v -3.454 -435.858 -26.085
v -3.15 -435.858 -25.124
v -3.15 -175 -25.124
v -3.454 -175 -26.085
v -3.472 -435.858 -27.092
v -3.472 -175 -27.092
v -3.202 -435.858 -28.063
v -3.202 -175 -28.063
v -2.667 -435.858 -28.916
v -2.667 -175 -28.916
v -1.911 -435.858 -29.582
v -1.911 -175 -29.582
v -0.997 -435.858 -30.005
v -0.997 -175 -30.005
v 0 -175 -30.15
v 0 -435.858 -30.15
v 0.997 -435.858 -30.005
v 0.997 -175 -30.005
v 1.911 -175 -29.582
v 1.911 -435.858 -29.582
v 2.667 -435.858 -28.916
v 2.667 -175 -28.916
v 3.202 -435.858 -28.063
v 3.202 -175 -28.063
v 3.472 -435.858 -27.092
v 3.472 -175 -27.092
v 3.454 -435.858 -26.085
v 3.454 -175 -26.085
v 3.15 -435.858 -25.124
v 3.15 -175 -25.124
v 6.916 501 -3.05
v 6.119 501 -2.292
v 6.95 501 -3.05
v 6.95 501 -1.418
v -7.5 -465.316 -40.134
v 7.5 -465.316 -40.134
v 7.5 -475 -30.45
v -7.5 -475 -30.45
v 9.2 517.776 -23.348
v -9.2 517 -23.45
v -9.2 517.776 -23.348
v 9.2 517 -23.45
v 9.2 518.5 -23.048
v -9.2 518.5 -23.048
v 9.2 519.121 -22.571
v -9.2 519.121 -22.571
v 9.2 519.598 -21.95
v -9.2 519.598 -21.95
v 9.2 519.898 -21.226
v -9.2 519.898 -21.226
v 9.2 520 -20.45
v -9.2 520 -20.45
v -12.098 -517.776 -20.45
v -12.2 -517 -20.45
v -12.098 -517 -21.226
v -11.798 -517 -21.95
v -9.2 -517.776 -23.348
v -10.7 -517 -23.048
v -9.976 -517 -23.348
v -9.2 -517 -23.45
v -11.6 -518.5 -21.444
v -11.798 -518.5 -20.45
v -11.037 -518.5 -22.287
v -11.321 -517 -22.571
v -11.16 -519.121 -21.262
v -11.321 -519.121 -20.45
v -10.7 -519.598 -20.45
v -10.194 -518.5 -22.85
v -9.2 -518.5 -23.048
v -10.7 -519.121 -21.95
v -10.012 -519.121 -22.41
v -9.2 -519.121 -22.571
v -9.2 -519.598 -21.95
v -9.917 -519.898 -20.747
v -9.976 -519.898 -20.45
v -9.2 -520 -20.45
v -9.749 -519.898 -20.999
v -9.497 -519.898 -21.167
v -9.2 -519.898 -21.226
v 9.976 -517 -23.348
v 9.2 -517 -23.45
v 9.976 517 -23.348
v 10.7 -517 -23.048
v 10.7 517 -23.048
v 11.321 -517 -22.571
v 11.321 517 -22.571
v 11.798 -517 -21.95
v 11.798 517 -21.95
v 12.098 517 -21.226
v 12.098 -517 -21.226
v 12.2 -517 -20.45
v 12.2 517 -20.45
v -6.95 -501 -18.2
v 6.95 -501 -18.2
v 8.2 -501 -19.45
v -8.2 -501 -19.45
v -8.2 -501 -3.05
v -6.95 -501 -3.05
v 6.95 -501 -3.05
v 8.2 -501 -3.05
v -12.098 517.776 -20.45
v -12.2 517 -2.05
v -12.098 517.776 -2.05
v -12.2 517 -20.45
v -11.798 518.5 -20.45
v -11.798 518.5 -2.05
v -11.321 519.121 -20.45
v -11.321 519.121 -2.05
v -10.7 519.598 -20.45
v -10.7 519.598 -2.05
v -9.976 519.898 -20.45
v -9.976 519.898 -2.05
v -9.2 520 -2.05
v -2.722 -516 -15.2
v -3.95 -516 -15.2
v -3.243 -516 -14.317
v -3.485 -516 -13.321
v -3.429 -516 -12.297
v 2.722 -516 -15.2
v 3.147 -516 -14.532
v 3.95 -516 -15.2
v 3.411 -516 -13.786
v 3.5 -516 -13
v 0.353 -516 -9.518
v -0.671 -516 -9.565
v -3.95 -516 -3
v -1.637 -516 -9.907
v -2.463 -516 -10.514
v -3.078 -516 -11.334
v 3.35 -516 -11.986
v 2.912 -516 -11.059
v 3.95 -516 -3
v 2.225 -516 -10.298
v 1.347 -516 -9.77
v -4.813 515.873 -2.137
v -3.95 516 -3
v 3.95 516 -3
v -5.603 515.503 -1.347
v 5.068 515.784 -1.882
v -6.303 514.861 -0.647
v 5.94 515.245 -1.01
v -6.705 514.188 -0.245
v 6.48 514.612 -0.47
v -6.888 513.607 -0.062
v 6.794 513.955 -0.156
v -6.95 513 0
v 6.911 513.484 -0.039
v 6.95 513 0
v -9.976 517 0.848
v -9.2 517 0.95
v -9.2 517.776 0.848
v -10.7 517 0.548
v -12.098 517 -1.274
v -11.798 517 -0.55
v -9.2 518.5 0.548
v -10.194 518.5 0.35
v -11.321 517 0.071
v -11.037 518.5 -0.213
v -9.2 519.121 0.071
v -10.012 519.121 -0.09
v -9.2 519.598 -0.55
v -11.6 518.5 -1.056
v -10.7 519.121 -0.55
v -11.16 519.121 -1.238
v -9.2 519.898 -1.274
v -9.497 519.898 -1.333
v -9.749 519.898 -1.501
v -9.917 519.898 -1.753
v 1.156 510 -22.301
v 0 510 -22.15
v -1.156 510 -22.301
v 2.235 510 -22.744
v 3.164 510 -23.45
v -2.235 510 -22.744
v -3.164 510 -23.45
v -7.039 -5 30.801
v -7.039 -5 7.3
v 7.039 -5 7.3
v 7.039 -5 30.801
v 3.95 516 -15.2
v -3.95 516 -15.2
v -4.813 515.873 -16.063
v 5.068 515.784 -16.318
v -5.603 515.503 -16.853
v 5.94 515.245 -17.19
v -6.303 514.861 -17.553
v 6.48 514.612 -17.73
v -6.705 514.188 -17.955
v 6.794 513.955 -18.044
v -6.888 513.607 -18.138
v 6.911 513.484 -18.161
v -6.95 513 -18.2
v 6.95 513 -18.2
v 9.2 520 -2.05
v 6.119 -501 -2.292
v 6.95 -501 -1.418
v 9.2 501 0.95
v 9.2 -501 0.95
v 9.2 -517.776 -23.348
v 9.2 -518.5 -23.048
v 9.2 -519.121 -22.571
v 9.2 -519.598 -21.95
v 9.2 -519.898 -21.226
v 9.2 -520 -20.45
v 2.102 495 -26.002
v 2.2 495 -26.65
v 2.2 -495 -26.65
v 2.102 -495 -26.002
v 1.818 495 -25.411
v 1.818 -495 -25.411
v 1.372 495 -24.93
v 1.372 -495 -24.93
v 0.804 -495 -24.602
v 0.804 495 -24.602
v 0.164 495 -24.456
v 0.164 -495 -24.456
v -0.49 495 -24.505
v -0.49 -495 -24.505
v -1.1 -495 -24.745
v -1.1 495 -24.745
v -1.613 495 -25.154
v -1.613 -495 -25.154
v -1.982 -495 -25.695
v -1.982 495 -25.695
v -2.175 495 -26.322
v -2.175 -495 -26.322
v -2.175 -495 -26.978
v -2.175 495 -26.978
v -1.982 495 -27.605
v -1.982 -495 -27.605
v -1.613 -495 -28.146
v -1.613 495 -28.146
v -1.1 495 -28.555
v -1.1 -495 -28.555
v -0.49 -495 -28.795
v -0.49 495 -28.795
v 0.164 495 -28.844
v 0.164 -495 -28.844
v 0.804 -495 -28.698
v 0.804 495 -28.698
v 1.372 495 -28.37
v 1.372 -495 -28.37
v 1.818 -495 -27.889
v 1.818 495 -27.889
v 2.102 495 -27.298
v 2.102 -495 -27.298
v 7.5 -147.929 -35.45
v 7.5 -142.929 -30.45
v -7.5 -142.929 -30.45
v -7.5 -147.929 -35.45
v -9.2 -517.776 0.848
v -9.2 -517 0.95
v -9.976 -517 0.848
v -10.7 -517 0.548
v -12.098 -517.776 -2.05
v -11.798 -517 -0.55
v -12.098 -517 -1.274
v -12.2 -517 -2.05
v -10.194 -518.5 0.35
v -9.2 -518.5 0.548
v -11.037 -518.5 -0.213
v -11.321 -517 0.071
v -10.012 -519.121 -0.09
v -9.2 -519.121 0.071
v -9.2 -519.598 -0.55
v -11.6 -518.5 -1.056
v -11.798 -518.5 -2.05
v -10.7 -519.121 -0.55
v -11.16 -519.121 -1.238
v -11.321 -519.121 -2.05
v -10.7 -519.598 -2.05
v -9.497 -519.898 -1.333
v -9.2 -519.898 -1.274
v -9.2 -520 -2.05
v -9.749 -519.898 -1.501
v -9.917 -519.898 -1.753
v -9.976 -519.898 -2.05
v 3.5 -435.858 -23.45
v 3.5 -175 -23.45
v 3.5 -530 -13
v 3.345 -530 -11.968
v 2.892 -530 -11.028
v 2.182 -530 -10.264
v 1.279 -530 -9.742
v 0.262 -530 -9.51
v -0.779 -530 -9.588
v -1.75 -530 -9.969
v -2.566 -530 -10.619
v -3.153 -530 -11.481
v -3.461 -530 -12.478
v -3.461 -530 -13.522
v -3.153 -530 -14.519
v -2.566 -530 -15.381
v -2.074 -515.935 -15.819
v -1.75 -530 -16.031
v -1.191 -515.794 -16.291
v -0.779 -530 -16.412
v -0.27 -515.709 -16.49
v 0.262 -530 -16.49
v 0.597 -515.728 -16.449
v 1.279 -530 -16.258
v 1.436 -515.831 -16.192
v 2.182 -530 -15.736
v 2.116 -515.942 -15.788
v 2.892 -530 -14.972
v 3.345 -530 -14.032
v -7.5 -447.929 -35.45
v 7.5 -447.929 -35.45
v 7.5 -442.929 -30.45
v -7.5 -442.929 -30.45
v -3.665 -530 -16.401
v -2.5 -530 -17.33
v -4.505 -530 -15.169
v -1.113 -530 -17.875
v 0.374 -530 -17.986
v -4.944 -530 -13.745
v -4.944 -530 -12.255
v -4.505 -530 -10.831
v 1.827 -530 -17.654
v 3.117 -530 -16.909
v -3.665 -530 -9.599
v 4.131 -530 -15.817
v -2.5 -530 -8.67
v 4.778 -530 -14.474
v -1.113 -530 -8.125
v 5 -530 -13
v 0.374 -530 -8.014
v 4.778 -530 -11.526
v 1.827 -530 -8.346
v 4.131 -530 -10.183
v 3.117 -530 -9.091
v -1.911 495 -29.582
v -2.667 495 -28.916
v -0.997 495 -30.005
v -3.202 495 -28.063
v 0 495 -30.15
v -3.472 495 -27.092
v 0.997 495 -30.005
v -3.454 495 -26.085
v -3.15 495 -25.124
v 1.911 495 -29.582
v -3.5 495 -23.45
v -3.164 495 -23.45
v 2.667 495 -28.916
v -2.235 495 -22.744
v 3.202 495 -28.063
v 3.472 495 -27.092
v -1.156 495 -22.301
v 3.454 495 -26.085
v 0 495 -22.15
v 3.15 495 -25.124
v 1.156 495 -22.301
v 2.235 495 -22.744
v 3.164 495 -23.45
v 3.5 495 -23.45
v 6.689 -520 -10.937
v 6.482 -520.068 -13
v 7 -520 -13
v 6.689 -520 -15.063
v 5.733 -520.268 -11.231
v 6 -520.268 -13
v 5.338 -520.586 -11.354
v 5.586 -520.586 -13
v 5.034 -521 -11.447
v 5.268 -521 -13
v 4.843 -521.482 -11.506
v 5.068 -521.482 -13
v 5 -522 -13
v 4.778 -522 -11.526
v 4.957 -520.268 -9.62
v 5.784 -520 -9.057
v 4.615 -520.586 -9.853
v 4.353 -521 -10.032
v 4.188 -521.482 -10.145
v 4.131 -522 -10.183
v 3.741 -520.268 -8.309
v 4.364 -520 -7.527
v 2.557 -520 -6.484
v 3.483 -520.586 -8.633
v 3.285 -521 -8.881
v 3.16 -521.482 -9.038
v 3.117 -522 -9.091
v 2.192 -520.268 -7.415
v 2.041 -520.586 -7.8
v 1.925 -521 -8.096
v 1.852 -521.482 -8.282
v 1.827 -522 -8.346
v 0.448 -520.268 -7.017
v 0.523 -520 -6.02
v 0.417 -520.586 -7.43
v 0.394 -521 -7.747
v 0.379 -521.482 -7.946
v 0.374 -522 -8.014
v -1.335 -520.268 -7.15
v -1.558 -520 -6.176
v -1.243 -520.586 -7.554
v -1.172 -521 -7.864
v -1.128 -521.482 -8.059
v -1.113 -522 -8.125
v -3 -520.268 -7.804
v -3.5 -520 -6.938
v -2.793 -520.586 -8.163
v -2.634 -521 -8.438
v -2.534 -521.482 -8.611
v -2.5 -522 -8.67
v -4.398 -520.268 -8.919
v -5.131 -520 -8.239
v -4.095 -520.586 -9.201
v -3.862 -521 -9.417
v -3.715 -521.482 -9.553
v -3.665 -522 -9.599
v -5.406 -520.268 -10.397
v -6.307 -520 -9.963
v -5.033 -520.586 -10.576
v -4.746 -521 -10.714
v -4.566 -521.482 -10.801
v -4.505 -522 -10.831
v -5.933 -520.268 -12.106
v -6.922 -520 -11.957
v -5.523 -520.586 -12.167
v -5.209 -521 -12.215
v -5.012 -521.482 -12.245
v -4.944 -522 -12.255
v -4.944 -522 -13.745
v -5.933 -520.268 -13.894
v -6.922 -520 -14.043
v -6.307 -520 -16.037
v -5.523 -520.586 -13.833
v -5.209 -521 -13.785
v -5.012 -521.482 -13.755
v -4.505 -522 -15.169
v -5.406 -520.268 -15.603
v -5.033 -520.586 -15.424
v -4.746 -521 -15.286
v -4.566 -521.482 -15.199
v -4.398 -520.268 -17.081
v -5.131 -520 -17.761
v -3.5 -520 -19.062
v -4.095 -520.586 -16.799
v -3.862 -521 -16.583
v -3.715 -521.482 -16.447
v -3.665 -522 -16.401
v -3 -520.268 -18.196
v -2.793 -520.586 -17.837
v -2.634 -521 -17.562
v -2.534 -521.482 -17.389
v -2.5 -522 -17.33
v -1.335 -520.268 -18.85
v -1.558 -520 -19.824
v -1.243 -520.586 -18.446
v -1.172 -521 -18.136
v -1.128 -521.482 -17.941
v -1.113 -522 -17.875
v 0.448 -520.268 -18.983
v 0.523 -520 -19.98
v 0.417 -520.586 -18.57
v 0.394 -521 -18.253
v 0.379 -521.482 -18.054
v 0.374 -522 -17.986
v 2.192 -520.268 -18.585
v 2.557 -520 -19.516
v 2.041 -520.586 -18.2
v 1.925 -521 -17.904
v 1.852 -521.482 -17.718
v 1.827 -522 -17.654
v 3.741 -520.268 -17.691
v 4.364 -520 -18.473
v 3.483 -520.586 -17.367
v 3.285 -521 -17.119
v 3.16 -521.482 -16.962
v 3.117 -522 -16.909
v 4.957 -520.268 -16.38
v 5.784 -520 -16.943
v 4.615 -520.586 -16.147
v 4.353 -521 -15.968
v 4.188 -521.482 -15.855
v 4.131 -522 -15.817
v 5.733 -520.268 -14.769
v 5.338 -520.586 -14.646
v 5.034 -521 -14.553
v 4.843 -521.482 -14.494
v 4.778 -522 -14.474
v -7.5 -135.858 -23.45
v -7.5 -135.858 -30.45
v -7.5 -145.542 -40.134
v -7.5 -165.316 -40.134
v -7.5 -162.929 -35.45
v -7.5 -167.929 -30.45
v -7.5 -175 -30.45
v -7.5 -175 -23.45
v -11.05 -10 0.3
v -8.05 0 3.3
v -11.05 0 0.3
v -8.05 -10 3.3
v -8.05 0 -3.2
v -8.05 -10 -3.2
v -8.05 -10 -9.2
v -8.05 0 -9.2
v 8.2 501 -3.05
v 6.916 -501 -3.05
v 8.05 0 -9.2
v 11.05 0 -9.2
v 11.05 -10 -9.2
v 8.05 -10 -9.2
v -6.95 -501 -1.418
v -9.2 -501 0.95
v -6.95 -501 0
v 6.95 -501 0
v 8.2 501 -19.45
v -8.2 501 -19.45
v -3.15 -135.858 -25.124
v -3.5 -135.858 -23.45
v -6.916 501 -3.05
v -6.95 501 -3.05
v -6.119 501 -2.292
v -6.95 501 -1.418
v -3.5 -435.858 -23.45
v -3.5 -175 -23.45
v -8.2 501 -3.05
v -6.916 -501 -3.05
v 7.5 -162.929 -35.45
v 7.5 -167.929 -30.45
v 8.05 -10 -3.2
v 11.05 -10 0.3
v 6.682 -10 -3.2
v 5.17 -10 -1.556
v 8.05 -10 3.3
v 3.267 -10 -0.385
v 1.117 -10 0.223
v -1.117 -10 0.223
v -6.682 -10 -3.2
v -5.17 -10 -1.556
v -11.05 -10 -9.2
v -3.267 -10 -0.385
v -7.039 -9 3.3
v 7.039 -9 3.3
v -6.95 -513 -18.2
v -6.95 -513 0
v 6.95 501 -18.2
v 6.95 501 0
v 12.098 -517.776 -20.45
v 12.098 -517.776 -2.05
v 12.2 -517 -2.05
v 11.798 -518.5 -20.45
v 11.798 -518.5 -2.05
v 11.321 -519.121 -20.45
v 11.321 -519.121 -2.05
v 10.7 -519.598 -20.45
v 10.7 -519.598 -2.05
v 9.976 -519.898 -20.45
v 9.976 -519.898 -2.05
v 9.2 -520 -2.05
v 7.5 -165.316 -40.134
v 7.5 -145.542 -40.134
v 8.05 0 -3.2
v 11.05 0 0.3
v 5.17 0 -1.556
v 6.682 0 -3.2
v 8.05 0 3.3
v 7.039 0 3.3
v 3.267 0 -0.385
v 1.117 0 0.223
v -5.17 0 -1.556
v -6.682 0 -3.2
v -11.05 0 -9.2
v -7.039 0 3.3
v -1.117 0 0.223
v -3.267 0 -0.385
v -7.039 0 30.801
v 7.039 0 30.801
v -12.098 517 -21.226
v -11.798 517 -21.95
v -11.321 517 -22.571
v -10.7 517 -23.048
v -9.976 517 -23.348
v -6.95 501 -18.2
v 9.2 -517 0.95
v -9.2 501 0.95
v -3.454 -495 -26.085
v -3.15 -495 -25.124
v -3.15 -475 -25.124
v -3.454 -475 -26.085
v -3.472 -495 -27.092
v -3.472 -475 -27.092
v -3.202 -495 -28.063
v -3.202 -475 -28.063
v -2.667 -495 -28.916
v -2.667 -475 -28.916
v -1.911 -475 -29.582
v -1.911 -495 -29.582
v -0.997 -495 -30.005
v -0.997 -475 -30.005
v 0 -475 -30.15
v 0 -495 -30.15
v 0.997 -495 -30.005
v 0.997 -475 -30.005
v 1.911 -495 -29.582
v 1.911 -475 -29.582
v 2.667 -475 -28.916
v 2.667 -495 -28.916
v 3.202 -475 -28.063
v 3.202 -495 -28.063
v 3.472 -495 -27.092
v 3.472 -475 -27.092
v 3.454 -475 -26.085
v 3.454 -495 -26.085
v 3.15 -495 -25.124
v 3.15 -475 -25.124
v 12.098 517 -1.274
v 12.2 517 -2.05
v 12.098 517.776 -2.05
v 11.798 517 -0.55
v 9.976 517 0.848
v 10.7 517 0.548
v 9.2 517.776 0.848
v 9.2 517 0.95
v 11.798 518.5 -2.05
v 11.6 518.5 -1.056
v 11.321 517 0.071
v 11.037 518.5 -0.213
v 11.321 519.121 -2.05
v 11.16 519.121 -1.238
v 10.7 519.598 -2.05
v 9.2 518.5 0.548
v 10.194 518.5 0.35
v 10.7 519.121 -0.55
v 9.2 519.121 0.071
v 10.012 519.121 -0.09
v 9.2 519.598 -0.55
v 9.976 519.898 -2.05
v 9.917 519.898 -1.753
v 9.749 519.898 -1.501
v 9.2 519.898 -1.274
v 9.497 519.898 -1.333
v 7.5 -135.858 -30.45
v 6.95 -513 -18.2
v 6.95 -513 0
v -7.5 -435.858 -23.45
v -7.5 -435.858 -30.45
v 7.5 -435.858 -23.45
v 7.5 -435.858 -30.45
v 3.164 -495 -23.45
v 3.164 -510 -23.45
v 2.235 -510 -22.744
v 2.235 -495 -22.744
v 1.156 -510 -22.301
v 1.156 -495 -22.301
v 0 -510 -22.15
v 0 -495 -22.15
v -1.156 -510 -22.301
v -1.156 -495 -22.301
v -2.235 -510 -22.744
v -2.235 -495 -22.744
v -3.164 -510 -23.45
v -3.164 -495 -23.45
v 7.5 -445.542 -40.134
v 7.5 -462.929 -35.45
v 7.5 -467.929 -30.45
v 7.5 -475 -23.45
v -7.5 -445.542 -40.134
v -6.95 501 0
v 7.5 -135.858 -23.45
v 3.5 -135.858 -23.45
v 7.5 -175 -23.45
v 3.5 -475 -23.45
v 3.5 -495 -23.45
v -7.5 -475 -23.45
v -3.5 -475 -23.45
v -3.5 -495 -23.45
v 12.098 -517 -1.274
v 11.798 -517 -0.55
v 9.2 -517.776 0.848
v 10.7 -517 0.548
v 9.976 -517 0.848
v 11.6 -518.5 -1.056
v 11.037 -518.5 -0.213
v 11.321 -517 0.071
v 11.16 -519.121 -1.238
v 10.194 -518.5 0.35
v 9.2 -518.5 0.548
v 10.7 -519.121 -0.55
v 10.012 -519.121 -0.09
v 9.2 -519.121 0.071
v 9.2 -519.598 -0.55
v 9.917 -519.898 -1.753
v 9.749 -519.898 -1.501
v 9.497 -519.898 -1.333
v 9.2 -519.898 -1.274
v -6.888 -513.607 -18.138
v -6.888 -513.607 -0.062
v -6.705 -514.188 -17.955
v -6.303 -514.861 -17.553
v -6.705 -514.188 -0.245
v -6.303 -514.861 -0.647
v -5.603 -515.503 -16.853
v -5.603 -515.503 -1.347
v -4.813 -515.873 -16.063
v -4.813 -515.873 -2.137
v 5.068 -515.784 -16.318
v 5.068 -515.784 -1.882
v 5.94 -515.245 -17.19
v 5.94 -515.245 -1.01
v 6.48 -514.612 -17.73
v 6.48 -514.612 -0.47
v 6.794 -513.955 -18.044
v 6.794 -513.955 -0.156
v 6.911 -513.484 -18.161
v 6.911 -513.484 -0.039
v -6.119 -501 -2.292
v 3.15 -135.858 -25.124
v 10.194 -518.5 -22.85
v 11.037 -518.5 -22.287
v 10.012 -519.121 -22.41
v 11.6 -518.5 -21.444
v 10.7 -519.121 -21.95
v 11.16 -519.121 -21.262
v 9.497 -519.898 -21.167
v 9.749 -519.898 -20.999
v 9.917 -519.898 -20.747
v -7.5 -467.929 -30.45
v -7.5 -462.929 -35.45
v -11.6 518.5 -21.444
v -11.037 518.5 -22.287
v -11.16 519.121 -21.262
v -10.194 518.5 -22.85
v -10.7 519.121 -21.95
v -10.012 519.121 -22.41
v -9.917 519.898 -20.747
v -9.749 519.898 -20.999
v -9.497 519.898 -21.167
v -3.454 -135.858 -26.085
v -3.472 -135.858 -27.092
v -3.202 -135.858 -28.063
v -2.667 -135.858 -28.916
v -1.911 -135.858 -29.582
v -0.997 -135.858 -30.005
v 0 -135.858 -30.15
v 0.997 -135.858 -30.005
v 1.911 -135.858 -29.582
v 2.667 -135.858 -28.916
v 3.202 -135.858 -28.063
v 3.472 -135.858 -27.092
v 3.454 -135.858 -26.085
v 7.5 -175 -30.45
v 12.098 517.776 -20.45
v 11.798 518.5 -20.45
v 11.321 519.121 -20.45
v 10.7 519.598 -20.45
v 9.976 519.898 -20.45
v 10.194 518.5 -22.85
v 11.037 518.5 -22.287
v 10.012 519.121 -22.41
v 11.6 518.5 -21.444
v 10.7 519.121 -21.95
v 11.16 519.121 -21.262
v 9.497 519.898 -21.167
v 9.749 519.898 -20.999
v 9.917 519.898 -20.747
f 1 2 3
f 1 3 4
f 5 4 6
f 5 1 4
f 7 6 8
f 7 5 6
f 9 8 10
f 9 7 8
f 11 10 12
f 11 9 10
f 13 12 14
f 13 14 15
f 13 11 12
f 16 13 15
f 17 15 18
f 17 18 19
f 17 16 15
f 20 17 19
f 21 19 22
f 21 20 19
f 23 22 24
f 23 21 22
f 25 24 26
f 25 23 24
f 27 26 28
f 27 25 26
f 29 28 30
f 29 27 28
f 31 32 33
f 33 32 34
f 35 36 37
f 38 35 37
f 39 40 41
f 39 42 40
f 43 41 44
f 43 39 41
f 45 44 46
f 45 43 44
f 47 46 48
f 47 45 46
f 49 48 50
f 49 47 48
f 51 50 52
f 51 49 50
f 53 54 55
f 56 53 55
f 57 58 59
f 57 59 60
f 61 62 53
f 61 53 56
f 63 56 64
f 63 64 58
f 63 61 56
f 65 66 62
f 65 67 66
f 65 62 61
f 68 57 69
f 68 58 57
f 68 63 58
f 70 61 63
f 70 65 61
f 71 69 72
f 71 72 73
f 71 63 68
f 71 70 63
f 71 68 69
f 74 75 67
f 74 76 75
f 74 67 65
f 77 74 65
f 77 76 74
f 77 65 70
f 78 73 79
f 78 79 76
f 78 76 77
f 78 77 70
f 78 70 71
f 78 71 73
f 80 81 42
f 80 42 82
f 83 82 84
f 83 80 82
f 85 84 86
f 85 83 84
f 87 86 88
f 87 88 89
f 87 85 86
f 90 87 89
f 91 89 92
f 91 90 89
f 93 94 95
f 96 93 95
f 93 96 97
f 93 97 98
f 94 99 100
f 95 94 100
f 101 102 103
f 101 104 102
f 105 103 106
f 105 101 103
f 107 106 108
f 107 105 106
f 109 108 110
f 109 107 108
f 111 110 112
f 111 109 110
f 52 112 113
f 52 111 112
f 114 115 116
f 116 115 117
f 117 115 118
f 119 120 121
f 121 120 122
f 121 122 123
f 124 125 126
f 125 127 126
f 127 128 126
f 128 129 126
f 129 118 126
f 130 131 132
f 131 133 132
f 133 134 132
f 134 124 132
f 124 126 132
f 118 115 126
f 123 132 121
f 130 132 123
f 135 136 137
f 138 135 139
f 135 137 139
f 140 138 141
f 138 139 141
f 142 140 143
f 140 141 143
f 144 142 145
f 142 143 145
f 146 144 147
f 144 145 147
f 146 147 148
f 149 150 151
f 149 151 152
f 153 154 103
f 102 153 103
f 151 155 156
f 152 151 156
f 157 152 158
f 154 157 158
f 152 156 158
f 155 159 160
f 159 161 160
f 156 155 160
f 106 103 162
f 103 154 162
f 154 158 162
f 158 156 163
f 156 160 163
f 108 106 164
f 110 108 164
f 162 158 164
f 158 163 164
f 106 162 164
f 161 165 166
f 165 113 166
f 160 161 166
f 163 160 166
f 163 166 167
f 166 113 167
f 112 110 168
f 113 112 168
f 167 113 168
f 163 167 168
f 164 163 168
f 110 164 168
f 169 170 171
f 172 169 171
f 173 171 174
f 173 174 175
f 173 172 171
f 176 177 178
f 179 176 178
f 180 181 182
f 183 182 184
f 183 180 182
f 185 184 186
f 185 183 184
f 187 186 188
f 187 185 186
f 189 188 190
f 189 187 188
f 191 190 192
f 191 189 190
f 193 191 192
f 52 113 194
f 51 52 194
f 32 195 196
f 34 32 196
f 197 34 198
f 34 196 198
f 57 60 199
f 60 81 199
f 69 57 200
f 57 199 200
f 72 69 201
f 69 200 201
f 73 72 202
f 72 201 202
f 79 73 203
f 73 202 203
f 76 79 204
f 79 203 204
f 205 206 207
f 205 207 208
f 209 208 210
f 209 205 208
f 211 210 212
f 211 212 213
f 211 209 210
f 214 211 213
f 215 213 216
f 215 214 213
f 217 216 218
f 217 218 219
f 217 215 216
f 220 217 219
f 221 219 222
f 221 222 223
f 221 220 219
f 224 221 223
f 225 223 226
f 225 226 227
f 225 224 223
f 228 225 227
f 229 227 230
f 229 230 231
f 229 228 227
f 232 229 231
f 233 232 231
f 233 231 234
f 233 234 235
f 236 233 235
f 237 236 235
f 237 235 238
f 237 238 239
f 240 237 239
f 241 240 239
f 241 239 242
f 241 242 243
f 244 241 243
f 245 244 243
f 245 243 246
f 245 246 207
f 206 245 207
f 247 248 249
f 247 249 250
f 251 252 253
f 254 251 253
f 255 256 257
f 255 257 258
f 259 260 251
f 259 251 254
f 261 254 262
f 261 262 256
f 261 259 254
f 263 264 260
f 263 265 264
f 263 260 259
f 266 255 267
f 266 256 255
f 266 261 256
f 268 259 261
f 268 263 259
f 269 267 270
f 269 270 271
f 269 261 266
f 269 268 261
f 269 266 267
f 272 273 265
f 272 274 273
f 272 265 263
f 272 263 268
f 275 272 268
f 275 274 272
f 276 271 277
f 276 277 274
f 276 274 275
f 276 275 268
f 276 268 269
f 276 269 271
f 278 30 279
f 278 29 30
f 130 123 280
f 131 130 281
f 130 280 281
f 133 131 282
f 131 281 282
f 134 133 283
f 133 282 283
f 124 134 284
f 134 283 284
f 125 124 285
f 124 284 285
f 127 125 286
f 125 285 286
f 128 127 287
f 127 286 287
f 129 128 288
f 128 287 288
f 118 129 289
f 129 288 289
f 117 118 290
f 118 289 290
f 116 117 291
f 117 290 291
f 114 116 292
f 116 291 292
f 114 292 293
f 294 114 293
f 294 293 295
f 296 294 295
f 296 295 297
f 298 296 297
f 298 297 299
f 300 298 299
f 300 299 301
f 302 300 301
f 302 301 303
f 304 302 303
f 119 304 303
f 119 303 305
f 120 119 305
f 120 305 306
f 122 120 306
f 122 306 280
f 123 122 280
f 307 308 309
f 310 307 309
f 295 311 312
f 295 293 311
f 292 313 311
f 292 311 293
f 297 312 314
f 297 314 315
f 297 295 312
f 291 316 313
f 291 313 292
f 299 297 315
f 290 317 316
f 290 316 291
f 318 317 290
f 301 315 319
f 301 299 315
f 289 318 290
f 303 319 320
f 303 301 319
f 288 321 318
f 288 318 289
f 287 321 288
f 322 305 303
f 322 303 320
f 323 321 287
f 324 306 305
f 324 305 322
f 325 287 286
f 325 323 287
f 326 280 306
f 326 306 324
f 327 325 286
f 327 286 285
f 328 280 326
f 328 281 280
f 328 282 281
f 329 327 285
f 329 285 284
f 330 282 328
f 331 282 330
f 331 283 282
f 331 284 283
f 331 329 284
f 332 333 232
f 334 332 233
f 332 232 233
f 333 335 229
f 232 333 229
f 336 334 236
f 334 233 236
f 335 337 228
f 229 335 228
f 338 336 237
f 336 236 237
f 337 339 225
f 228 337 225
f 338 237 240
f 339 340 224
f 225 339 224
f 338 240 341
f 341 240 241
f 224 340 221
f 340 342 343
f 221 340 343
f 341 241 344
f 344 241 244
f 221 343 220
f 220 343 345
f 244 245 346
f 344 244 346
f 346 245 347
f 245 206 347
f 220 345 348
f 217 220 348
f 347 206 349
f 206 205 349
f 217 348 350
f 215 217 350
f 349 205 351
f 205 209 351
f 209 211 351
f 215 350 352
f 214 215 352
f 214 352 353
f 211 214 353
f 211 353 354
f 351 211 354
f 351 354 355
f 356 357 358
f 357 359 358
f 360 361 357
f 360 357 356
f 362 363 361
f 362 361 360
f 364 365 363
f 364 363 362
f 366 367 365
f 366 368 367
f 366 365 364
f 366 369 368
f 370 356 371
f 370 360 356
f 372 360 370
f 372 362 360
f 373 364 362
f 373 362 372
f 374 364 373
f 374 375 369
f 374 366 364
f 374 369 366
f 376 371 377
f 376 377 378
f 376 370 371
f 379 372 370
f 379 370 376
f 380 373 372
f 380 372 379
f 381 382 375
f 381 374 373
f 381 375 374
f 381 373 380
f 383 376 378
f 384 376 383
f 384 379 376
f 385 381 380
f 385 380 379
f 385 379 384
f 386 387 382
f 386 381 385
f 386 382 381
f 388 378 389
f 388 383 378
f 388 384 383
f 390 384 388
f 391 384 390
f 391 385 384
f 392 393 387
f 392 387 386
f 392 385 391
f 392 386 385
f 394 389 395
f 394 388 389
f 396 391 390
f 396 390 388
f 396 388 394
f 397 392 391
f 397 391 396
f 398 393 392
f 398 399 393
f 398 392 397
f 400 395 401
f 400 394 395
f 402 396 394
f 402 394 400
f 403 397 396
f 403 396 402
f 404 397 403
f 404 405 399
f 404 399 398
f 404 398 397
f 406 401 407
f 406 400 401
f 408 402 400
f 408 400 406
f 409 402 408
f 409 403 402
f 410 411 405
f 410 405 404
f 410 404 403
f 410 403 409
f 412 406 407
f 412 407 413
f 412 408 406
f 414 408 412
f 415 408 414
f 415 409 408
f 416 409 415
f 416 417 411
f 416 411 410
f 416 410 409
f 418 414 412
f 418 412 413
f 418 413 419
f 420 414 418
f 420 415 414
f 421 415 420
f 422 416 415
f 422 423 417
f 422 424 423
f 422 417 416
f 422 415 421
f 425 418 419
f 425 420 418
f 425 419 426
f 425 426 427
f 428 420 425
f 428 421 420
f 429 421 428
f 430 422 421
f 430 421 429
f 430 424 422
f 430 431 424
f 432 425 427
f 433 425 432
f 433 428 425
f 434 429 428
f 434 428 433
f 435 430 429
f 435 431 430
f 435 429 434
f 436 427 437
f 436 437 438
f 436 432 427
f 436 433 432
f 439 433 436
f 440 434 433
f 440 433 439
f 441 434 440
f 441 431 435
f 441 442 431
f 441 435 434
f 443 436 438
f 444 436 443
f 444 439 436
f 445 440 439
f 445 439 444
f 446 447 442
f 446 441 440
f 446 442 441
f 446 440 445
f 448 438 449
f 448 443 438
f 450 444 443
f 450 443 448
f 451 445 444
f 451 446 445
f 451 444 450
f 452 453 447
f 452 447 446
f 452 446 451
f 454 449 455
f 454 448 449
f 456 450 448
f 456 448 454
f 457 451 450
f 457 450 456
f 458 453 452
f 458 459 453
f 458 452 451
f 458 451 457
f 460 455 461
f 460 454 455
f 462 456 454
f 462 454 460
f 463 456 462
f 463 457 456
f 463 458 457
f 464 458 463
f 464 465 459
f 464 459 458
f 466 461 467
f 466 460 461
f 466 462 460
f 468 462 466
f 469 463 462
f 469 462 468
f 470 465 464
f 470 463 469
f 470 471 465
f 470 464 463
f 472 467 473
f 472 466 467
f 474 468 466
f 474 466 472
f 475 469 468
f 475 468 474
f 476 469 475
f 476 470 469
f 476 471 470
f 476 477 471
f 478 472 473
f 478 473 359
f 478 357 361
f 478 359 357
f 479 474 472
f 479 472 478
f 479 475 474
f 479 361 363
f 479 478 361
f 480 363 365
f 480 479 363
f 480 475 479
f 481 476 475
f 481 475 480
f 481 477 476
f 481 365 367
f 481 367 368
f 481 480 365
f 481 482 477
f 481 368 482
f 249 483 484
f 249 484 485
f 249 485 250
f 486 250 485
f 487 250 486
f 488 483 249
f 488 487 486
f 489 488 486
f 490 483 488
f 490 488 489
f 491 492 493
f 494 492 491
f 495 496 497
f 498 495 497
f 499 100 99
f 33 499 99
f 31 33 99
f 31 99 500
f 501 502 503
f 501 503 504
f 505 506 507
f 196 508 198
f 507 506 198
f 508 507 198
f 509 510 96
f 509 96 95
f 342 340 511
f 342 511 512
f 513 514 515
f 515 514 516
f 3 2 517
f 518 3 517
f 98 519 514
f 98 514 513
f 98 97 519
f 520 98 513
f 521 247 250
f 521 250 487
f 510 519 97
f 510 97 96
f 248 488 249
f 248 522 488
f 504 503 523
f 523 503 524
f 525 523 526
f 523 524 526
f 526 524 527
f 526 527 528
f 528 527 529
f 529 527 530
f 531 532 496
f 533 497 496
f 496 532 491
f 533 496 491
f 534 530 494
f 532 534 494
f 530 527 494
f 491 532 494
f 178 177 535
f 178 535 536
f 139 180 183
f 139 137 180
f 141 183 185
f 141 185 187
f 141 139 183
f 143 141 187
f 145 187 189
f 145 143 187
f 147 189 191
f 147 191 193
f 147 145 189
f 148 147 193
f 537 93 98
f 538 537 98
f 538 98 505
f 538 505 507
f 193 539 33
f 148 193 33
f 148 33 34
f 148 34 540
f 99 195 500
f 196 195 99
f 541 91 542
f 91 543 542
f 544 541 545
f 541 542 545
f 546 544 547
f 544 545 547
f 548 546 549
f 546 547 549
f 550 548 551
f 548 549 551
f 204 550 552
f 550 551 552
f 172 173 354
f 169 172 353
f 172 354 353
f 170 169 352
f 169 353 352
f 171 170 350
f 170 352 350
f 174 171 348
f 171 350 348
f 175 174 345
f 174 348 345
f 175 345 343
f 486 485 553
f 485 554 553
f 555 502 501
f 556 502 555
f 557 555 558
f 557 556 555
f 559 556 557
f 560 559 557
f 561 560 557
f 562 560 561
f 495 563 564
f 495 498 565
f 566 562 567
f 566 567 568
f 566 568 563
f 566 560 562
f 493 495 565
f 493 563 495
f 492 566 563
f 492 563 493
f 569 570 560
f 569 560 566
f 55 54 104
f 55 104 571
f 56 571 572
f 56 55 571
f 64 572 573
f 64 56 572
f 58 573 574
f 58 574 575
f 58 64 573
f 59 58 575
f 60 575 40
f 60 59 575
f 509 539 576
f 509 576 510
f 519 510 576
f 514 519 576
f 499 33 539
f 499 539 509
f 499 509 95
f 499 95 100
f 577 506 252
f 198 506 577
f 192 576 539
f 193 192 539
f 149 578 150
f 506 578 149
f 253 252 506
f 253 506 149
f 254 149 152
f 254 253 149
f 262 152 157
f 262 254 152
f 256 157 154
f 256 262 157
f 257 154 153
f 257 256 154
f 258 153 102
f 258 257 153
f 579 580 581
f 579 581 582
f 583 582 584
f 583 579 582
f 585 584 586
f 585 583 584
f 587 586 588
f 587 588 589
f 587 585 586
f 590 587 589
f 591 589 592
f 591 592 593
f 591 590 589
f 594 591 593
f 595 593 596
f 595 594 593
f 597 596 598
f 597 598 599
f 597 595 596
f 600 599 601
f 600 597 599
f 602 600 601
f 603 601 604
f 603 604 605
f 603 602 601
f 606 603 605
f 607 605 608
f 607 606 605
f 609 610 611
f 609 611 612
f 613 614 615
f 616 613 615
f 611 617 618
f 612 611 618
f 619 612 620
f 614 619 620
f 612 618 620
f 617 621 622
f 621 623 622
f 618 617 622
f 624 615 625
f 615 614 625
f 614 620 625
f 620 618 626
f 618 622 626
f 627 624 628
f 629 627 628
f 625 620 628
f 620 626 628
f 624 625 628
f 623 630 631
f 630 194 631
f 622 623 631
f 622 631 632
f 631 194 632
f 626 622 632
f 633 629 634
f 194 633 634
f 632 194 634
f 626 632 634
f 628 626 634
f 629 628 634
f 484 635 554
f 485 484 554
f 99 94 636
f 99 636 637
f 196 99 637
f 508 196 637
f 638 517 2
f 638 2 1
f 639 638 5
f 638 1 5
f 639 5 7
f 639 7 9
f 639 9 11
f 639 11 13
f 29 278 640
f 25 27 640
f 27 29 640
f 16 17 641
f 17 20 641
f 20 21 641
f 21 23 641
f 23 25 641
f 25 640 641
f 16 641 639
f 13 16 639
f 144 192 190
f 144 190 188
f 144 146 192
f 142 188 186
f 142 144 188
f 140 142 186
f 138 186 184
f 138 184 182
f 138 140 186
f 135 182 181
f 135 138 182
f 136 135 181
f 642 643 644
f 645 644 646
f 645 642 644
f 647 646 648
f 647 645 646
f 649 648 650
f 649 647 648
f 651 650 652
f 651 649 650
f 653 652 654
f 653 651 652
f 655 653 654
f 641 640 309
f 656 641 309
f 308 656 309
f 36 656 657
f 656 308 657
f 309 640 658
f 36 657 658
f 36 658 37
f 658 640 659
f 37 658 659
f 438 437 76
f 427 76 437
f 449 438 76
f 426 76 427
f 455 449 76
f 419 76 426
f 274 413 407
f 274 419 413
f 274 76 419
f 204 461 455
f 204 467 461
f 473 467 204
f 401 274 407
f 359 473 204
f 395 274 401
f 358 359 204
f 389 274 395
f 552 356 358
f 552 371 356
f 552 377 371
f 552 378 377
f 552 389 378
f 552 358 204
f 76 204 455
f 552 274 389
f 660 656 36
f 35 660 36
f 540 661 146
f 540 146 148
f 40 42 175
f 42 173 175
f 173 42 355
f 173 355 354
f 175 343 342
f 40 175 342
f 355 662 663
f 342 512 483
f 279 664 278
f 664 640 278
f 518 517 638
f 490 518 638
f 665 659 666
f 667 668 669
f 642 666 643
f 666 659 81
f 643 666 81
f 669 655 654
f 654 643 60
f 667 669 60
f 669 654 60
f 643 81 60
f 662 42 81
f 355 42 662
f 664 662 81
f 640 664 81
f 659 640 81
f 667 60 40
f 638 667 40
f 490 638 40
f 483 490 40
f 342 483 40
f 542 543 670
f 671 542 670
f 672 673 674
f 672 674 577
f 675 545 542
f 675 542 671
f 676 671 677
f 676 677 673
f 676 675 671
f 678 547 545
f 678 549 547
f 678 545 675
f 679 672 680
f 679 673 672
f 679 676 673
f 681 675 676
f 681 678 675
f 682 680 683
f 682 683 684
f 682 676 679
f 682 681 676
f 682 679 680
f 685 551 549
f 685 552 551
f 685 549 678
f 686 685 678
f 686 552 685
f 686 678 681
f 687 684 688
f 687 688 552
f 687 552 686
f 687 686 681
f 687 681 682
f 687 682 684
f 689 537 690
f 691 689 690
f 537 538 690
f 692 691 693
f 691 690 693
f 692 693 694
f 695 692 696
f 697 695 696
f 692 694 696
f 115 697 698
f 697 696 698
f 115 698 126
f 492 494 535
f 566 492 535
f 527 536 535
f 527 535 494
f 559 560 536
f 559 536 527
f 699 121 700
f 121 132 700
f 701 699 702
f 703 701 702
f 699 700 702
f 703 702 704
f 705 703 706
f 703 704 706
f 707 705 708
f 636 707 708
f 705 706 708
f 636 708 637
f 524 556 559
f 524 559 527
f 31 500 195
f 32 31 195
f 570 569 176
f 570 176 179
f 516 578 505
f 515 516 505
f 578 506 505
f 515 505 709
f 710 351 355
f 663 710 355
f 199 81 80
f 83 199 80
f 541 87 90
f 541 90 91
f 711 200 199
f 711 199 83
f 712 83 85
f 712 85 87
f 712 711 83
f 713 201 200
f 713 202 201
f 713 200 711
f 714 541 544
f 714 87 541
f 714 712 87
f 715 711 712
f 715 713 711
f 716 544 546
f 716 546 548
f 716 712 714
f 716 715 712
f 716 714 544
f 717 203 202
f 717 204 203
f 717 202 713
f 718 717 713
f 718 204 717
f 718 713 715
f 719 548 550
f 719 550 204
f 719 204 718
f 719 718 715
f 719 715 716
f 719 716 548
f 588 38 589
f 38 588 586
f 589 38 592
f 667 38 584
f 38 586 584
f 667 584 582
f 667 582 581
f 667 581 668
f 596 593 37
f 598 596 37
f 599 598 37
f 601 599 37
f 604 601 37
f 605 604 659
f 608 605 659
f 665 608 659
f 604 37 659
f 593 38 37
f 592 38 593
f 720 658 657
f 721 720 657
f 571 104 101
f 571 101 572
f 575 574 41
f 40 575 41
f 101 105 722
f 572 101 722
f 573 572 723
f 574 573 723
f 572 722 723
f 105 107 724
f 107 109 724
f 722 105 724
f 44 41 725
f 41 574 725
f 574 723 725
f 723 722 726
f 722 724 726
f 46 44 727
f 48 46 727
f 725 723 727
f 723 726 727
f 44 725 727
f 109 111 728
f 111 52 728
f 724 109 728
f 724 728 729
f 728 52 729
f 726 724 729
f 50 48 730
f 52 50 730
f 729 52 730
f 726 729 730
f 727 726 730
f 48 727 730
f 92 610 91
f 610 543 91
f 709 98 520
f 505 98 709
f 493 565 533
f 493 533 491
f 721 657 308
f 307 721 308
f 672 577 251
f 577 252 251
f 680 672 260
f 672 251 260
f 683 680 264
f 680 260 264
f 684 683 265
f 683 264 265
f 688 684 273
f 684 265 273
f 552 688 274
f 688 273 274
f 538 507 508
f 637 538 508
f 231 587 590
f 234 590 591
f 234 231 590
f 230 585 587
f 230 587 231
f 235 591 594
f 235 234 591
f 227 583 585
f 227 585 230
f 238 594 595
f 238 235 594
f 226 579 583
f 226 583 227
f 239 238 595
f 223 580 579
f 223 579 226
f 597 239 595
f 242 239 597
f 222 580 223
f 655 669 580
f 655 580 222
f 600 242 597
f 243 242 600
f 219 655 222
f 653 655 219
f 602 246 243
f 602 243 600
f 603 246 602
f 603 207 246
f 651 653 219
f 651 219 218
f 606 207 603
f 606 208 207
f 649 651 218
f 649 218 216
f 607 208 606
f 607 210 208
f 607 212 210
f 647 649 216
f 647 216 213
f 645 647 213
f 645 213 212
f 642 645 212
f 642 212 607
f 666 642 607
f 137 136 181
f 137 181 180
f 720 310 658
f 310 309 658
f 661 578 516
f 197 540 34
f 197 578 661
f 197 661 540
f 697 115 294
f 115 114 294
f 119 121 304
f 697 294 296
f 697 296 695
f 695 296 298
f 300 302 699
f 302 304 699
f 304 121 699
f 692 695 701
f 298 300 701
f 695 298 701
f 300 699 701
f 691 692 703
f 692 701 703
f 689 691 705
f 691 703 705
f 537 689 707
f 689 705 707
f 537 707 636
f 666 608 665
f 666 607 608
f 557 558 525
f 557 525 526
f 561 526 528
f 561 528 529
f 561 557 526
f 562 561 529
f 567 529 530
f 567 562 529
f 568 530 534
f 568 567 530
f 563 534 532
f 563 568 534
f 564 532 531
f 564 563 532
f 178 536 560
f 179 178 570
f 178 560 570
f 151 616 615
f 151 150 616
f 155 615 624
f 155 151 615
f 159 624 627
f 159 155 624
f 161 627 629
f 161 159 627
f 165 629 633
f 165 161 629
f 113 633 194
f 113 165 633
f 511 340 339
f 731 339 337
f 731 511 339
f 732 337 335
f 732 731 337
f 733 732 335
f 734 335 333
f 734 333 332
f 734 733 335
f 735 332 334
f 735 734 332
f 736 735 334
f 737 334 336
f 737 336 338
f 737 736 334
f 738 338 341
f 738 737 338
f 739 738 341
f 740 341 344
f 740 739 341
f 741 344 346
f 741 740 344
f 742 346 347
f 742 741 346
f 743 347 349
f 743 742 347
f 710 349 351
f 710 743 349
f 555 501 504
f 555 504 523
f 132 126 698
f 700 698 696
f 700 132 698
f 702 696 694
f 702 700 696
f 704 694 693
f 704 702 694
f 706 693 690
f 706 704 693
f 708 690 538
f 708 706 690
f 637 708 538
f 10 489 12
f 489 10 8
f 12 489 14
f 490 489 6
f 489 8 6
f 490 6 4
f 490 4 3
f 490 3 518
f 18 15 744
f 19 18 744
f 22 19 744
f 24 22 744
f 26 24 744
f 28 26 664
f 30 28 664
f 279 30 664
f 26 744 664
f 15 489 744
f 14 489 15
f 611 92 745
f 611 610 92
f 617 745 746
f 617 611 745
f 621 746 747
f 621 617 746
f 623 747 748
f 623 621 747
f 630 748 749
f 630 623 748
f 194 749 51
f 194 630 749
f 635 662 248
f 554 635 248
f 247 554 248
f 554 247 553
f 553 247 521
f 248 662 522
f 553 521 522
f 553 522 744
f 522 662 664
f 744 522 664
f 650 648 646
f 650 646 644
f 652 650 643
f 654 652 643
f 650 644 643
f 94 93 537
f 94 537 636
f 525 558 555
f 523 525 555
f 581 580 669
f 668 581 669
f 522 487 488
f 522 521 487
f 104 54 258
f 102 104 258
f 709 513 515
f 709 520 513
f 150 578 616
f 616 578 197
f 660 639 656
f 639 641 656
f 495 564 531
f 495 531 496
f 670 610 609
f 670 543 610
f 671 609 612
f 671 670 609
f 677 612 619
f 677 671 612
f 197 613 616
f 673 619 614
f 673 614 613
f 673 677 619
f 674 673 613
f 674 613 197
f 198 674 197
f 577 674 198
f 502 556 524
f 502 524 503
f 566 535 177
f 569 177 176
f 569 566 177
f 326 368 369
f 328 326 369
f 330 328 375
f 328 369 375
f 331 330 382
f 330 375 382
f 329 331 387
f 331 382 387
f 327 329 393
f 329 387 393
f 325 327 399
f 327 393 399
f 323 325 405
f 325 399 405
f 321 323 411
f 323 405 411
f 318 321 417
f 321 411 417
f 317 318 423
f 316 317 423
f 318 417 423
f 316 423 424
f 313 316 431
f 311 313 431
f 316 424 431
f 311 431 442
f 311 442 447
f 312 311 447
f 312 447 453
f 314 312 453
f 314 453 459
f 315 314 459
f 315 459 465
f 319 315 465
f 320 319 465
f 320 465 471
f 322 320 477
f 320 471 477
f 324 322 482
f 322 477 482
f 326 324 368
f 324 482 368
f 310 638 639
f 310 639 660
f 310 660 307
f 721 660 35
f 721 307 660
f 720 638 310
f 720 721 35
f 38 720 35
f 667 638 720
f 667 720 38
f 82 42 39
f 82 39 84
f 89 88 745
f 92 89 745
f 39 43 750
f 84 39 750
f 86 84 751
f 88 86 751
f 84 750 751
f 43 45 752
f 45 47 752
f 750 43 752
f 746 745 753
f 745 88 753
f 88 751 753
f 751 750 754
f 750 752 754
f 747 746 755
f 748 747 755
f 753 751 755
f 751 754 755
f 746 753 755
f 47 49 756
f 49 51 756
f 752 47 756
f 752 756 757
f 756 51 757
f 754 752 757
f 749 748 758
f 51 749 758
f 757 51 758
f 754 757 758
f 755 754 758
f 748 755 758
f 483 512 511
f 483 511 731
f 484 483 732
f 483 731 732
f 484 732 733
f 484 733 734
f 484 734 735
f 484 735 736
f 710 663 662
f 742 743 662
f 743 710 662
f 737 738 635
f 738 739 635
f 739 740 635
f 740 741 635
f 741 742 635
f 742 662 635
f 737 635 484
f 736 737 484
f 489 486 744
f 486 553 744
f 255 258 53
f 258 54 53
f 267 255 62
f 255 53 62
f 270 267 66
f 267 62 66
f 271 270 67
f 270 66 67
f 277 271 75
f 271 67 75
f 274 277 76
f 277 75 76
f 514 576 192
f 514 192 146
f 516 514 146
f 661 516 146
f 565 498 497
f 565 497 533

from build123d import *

# Parameters (mm, degrees)
PAD_DEPTH            = 10
CHAMFER_SIZE         = 3
SKETCH018_W          = 14.07752
SKETCH018_H          = 28.079826
PAD009_DEPTH         = 5
CHAMFER001_SIZE      = 4
PAD017_DEPTH         = 7.5
SKETCH026_R          = 2.2
POCKET004_DEPTH      = 0.001
POCKET004_DEPTH_BACK = 475.001
PAD008_DEPTH         = 501
SKETCH019_R          = 2.2
PAD010_DEPTH         = 495
SKETCH020_W          = 13.9
SKETCH020_H          = 18.2
PAD011_DEPTH         = 15
PAD012_DEPTH         = 4
SKETCH022_R          = 4.5
POCKET_DEPTH         = 15
FILLET_R             = 3
SKETCH023_R          = 5
PAD016_DEPTH         = 10
SKETCH024_R          = 3.5
POCKET003_DEPTH      = 17
FILLET001_R          = 2


with BuildPart() as stripplacer:
    # Sketch017 → Pad (new body)
    with BuildSketch(Plane.XZ):
        with BuildLine():
            ThreePointArc((6.682066, -3.2), (0, 0.3), (-6.682066, -3.2))
            Line((-6.682066, -3.2), (-8.05, -3.2))
            Line((-8.05, -3.2), (-8.05, -9.2))
            Line((-8.05, -9.2), (-11.05, -9.2))
            Line((-11.05, -9.2), (-11.05, 3.3))
            Line((-11.05, 3.3), (11.05, 3.3))
            Line((11.05, 3.3), (11.05, -9.2))
            Line((11.05, -9.2), (8.05, -9.2))
            Line((8.05, -9.2), (8.05, -3.2))
            Line((6.682066, -3.2), (8.05, -3.2))
        make_face()
    extrude(amount=PAD_DEPTH)

    # Chamfer
    chamfer_edges = [stripplacer.edges().sort_by_distance(p)[0] for p in [
        (11.05, -5, 3.3),
        (-11.05, -5, 3.3),
    ]]
    chamfer(chamfer_edges, length=CHAMFER_SIZE)

    # Sketch018 → Pad009 (join)
    with BuildSketch(Plane.XZ):
        with Locations((0, 16.761206)):
            Rectangle(SKETCH018_W, SKETCH018_H)
    extrude(amount=PAD009_DEPTH)

    # Chamfer001
    chamfer001_edges = [stripplacer.edges().sort_by_distance(p)[0] for p in [
        (0, -5, 3.3),
    ]]
    chamfer(chamfer001_edges, length=CHAMFER001_SIZE)


with BuildPart() as scratch:
    # Sketch025 → Pad017 (new body, symmetric)
    with BuildSketch(Plane.YZ):
        Polygon((-135.857864, -30.45), (-145.542163, -40.134299), (-165.315701, -40.134299), (-175, -30.45), (-175, -23.45), (-435.857864, -23.45), (-435.857864, -30.45), (-445.542163, -40.134299), (-465.315701, -40.134299), (-475, -30.45), (-475, -22.45), (-135.857864, -22.45), align=None)
        Polygon((-167.928932, -30.45), (-142.928932, -30.45), (-147.928932, -35.45), (-162.928932, -35.45), align=None, mode=Mode.SUBTRACT)
        Polygon((-442.928932, -30.45), (-467.928932, -30.45), (-462.928932, -35.45), (-447.928932, -35.45), align=None, mode=Mode.SUBTRACT)
    extrude(amount=PAD017_DEPTH, both=True)

    # Sketch026 → Pocket004 (cut, two sides)
    with BuildSketch(Plane.XZ) as pocket004_sk:
        with Locations((0, -26.65)):
            Circle(SKETCH026_R)
    extrude(amount=-POCKET004_DEPTH, mode=Mode.SUBTRACT)
    extrude(pocket004_sk.sketch, amount=POCKET004_DEPTH_BACK, mode=Mode.SUBTRACT)


with BuildPart() as halfbodyrod:
    # Sketch016 → Pad008 (new body)
    with BuildSketch(Plane.XZ):
        with BuildLine():
            ThreePointArc((-9.2, 0.95), (-11.32132, 0.07132), (-12.2, -2.05))
            Line((-12.2, -20.45), (-12.2, -2.05))
            ThreePointArc((-12.2, -20.45), (-11.32132, -22.57132), (-9.2, -23.45))
            Line((9.2, -23.45), (-9.2, -23.45))
            ThreePointArc((9.2, -23.45), (11.32132, -22.57132), (12.2, -20.45))
            Line((12.2, -2.05), (12.2, -20.45))
            ThreePointArc((12.2, -2.05), (11.32132, 0.07132), (9.2, 0.95))
            Line((6.11895, -2.292259), (9.2, 0.95))
            Line((6.916338, -3.05), (6.11895, -2.292259))
            Line((8.2, -3.05), (6.916338, -3.05))
            Line((8.2, -19.45), (8.2, -3.05))
            Line((-8.2, -19.45), (8.2, -19.45))
            Line((-8.2, -3.05), (-8.2, -19.45))
            Line((-8.2, -3.05), (-6.916338, -3.05))
            Line((-6.916338, -3.05), (-6.11895, -2.292259))
            Line((-9.2, 0.95), (-6.11895, -2.292259))
        make_face()
    extrude(amount=PAD008_DEPTH)

    # Sketch019 → Pad010 (join)
    with BuildSketch(Plane.XZ):
        with BuildLine():
            ThreePointArc((-3.15, -25.124385), (0, -30.15), (3.15, -25.124385))
            Line((3.15, -25.124385), (3.5, -23.45))
            Line((-3.5, -23.45), (3.5, -23.45))
            Line((-3.15, -25.124385), (-3.5, -23.45))
        make_face()
        with Locations((0, -26.65)):
            Circle(SKETCH019_R, mode=Mode.SUBTRACT)
    extrude(amount=PAD010_DEPTH)

    # Sketch020 → Pad011 (join)
    with BuildSketch(Plane.XZ.offset(501)):
        with BuildLine():
            ThreePointArc((-9.2, 0.95), (-11.32132, 0.07132), (-12.2, -2.05))
            Line((-12.2, -20.45), (-12.2, -2.05))
            ThreePointArc((-12.2, -20.45), (-11.32132, -22.57132), (-9.2, -23.45))
            Line((9.2, -23.45), (-9.2, -23.45))
            ThreePointArc((9.2, -23.45), (11.32132, -22.57132), (12.2, -20.45))
            Line((12.2, -2.05), (12.2, -20.45))
            ThreePointArc((12.2, -2.05), (11.32132, 0.07132), (9.2, 0.95))
            Line((-9.2, 0.95), (9.2, 0.95))
        make_face()
        with Locations((0, -9.1)):
            Rectangle(SKETCH020_W, SKETCH020_H, mode=Mode.SUBTRACT)
    extrude(amount=PAD011_DEPTH)

    # Sketch021 → Pad012 (join)
    with BuildSketch(Plane.XZ.offset(516)):
        with BuildLine():
            ThreePointArc((-9.2, 0.95), (-11.32132, 0.07132), (-12.2, -2.05))
            Line((-12.2, -20.45), (-12.2, -2.05))
            ThreePointArc((-12.2, -20.45), (-11.32132, -22.57132), (-9.2, -23.45))
            Line((9.2, -23.45), (-9.2, -23.45))
            ThreePointArc((9.2, -23.45), (11.32132, -22.57132), (12.2, -20.45))
            Line((12.2, -2.05), (12.2, -20.45))
            ThreePointArc((12.2, -2.05), (11.32132, 0.07132), (9.2, 0.95))
            Line((-9.2, 0.95), (9.2, 0.95))
        make_face()
    extrude(amount=PAD012_DEPTH)

    # Sketch022 → Pocket (cut)
    with BuildSketch(Plane.XZ.offset(495)):
        with Locations((0, -26.65)):
            Circle(SKETCH022_R)
    extrude(amount=POCKET_DEPTH, mode=Mode.SUBTRACT)

    # Fillet
    fillet_edges = [halfbodyrod.edges().sort_by_distance(p)[0] for p in [
        (-6.95, -516, -9.1),
        (0, -516, -18.2),
        (6.95, -516, -9.1),
        (0, -516, 0),
        (-11.32132, -520, 0.07132),
        (-12.2, -520, -11.25),
        (-11.32132, -520, -22.57132),
        (0, -520, -23.45),
        (11.32132, -520, -22.57132),
        (12.2, -520, -11.25),
        (11.32132, -520, 0.07132),
        (0, -520, 0.95),
    ]]
    fillet(fillet_edges, radius=FILLET_R)


with BuildPart() as mrhalfbodyrod:
    # Part__Mirroring: instance of HalfBodyRod
    add(halfbodyrod.part.mirror(Plane(origin=(0, 0, 0), x_dir=(1, 0, 0), z_dir=(0, 1, 0))))


with BuildPart() as body:
    # Fusion base: copy of HalfBodyRod
    add(halfbodyrod.part)

    # Fusion: union mrHalfBodyRod
    add(mrhalfbodyrod.part)

    # Sketch023 → Pad016 (new body)
    with BuildSketch(Plane.XZ.offset(520)):
        with Locations((0, -13)):
            Circle(SKETCH023_R)
    extrude(amount=PAD016_DEPTH)

    # Sketch024 → Pocket003 (cut)
    with BuildSketch(Plane.XZ.offset(530)):
        with Locations((0, -13)):
            Circle(SKETCH024_R)
    extrude(amount=-POCKET003_DEPTH, mode=Mode.SUBTRACT)

    # Fillet001
    fillet001_edges = [body.edges().sort_by_distance(p)[0] for p in [
        (-5, -520, -13),
    ]]
    fillet(fillet001_edges, radius=FILLET001_R)

    # Fusion001: union Scratch
    add(scratch.part)


solid = Compound([stripplacer.part, body.part])
